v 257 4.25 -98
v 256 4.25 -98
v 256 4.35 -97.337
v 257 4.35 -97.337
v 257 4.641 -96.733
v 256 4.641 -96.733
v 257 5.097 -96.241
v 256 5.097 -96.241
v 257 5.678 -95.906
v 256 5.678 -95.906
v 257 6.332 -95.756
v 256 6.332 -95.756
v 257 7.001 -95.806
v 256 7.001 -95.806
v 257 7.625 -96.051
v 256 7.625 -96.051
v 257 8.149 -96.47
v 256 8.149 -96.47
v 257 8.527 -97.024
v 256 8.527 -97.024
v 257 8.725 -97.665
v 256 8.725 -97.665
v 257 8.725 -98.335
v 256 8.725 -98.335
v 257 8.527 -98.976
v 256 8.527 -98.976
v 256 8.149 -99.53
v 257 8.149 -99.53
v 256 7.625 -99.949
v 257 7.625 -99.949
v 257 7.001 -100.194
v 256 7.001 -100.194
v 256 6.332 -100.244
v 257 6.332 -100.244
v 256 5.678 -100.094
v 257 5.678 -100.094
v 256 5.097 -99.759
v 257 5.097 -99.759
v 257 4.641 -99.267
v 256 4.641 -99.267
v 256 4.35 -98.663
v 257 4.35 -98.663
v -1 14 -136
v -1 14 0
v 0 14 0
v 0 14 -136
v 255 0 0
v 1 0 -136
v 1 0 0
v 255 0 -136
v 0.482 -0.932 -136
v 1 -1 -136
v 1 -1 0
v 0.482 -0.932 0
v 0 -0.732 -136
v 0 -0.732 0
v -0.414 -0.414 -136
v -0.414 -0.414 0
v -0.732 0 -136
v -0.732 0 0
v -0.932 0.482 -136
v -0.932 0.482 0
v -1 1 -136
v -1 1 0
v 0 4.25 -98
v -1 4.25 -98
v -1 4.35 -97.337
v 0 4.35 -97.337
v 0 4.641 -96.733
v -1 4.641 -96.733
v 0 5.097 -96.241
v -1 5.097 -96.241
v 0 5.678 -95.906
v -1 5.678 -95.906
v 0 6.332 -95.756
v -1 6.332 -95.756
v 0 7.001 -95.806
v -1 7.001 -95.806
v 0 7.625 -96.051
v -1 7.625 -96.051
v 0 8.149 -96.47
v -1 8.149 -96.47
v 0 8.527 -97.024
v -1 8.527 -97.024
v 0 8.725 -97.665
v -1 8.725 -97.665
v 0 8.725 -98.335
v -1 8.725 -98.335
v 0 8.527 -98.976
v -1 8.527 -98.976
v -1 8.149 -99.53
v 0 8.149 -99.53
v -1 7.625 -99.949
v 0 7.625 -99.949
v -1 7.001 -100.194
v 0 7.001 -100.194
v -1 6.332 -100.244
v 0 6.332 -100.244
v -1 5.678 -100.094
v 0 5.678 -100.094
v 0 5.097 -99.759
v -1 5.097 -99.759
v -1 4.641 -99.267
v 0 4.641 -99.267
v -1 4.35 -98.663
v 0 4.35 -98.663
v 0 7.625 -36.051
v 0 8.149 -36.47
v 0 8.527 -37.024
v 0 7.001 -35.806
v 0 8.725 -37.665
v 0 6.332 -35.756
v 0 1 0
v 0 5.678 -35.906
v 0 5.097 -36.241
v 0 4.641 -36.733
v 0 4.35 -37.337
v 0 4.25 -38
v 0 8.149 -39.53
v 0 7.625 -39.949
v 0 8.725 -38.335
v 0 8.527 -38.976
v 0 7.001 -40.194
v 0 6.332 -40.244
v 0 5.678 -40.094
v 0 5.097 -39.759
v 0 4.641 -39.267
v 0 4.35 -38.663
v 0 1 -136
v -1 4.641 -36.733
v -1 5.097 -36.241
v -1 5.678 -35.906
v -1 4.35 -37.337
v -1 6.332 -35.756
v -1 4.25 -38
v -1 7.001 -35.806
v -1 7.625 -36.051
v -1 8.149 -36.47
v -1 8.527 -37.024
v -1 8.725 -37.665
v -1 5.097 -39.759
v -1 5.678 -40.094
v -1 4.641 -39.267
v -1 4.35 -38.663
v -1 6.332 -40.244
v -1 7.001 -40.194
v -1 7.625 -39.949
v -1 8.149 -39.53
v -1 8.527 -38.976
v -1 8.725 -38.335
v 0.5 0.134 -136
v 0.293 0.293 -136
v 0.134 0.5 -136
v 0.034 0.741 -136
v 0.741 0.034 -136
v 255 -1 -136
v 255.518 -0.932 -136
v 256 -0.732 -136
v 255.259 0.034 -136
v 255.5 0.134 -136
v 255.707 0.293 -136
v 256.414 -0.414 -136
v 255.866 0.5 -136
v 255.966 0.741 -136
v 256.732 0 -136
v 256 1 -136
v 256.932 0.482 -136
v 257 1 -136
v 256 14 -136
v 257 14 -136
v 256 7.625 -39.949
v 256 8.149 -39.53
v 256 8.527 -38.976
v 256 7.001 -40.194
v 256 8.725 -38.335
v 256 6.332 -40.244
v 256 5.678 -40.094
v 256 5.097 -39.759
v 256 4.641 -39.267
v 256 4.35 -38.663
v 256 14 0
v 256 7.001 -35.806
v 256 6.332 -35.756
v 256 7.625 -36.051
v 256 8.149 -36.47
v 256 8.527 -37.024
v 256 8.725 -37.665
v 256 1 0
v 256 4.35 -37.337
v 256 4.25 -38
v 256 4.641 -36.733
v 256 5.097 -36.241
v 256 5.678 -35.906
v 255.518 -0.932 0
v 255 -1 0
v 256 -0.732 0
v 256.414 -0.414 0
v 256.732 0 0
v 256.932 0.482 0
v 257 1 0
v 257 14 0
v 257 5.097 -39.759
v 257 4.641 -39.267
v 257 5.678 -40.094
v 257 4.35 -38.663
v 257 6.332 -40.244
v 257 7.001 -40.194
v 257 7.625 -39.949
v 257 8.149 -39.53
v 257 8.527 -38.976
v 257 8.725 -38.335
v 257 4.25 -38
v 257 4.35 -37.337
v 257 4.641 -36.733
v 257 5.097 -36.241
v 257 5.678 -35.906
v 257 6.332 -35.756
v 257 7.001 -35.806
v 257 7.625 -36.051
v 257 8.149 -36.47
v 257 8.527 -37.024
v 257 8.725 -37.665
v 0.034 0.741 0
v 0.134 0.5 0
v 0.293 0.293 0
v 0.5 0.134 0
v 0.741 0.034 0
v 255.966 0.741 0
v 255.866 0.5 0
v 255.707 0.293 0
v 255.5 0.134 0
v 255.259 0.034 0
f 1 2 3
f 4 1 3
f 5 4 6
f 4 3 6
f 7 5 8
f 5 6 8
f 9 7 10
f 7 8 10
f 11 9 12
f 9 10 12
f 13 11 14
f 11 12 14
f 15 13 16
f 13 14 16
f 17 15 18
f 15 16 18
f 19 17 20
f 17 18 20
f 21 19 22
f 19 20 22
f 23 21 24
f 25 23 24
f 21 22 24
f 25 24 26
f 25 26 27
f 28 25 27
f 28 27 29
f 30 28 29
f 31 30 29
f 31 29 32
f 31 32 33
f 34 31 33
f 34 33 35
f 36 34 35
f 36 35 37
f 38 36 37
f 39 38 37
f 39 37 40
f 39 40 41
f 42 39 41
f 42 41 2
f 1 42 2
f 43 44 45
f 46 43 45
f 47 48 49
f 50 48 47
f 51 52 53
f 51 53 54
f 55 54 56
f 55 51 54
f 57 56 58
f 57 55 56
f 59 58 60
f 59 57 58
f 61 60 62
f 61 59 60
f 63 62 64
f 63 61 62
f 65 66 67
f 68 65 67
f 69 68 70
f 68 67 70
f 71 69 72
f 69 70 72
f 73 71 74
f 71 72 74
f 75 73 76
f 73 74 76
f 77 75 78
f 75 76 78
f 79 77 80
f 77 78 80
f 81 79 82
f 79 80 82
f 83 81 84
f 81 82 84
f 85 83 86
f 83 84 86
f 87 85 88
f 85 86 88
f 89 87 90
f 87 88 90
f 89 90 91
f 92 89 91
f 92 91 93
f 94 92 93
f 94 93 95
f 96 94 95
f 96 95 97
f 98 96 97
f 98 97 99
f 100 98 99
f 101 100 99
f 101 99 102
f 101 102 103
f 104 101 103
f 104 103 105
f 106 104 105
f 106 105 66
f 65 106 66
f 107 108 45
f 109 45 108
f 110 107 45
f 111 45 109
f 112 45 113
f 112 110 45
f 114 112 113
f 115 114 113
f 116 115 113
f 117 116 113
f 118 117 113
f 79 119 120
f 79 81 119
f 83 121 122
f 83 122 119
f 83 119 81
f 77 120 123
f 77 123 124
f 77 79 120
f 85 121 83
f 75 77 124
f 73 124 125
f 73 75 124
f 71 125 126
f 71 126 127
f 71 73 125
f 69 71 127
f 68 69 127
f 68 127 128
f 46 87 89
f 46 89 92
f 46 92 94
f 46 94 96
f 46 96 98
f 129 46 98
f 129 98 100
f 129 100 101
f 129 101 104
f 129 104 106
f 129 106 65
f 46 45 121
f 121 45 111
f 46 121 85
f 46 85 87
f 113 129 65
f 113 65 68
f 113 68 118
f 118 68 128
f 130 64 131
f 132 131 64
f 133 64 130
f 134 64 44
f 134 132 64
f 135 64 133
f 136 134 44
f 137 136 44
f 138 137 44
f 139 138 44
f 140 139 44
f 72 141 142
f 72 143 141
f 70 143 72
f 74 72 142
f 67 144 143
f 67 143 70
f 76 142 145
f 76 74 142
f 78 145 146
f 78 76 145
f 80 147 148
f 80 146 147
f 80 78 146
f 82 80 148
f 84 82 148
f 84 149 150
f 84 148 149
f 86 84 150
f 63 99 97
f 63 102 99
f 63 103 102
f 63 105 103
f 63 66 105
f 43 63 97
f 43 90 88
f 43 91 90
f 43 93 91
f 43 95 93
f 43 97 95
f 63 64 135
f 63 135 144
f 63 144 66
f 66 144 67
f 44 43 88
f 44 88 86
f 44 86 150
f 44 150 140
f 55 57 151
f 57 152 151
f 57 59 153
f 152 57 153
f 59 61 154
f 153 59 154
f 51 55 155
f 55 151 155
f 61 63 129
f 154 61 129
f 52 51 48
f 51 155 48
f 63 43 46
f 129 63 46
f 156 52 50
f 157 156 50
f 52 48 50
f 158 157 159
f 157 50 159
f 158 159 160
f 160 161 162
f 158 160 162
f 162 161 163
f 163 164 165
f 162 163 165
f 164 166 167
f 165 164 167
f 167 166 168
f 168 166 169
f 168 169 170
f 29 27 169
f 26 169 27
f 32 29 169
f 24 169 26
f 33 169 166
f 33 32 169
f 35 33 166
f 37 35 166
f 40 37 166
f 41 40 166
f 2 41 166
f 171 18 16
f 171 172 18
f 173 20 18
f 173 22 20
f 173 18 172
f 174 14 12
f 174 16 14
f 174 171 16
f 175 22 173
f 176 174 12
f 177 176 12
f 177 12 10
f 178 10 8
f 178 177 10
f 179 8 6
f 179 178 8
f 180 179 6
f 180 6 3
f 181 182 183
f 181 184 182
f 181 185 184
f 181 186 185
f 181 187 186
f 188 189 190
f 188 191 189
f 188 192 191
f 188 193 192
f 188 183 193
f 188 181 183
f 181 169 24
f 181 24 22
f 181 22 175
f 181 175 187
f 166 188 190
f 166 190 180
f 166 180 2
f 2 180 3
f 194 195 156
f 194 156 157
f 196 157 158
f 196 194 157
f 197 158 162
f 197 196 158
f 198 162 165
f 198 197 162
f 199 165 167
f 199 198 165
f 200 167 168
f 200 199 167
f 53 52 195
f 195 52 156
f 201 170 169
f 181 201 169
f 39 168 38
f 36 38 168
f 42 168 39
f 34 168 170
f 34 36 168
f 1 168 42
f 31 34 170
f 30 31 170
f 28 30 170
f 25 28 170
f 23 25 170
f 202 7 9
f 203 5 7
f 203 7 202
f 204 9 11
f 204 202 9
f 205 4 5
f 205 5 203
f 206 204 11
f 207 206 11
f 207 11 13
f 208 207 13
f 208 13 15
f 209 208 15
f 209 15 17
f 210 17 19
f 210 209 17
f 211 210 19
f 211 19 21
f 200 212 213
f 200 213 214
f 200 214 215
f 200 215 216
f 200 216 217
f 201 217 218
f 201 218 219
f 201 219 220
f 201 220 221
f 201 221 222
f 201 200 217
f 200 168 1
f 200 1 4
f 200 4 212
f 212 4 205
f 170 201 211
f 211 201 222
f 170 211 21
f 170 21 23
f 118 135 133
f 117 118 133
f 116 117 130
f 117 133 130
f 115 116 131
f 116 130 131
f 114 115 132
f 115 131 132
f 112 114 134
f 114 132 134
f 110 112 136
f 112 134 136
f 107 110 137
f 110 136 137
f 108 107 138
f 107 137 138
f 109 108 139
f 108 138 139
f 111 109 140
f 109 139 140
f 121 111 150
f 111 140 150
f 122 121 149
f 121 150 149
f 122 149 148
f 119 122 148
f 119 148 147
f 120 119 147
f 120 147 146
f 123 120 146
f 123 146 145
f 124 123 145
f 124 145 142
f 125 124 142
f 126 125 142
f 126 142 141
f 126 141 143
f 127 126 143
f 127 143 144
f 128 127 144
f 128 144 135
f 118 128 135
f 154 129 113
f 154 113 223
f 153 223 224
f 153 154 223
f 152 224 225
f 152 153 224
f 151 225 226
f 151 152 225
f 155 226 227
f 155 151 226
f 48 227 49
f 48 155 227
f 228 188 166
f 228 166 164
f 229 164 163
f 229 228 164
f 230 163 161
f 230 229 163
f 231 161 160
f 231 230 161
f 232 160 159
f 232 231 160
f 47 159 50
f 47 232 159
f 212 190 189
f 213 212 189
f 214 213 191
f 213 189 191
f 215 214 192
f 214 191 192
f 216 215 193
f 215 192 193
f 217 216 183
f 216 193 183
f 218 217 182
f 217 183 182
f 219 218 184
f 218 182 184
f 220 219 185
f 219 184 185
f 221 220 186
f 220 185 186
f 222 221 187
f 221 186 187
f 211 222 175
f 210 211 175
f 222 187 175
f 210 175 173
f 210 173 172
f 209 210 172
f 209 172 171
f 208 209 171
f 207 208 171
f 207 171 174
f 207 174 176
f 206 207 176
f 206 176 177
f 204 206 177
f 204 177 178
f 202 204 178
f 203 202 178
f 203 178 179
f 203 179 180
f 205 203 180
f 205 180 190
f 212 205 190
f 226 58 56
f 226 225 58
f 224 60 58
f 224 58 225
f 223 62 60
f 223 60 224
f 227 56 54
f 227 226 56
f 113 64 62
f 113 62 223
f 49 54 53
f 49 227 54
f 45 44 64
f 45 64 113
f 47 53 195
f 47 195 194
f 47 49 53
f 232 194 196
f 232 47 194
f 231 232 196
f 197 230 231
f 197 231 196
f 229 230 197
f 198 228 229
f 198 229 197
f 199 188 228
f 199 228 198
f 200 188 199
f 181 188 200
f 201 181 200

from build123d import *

# Parameters (mm, degrees)
SKETCH1_W                    = 256
SKETCH1_H                    = 136
BASE_FLANGE1_DEPTH           = 1
EDGE_FLANGE1_STRIP_W         = 6
EDGE_FLANGE1_STRIP_H         = 1
EDGE_FLANGE1_STRIP_CUT_DEPTH = 136
EDGE_FLANGE1_DEPTH           = 136
EDGE_FLANGE2_STRIP_W         = 6
EDGE_FLANGE2_STRIP_H         = 1
EDGE_FLANGE2_STRIP_CUT_DEPTH = 136
EDGE_FLANGE2_DEPTH           = 136
SKETCH12_R                   = 2.25
CUT_EXTRUDE1_DEPTH           = 278


# Sheet-metal steps are written as plain solids
with BuildPart() as part:
    # Sketch1 → Base-Flange1 (new body)
    with BuildSketch(Plane(origin=(0, 0, 0), x_dir=(1, 0, 0), z_dir=(0, 1, 0))):
        with Locations((128, 68)):
            Rectangle(SKETCH1_W, SKETCH1_H)
    extrude(amount=-BASE_FLANGE1_DEPTH)

    # Edge-Flange1 strip (across the edge) → Edge-Flange1 strip cut (cut)
    with BuildSketch(Plane.XY.offset(-136)):
        with Locations((-2, -0.5)):
            Rectangle(EDGE_FLANGE1_STRIP_W, EDGE_FLANGE1_STRIP_H)
    extrude(amount=EDGE_FLANGE1_STRIP_CUT_DEPTH, mode=Mode.SUBTRACT)

    # Edge-Flange1 section (across the edge) → Edge-Flange1 (add)
    with BuildSketch(Plane.XY.offset(-136)):
        with BuildLine():
            Line((-1, 1), (-1, 14))
            Line((-1, 14), (0, 14))
            Line((0, 14), (0, 1))
            ThreePointArc((0, 1), (0.292893219, 0.292893219), (1, 0))
            Line((1, 0), (1, -1))
            ThreePointArc((1, -1), (-0.414213562, -0.414213562), (-1, 1))
        make_face()
    extrude(amount=EDGE_FLANGE1_DEPTH)

    # Edge-Flange2 strip (across the edge) → Edge-Flange2 strip cut (cut)
    with BuildSketch(Plane(origin=(256, 0, 0), x_dir=(-1, 0, 0), z_dir=(0, 0, -1))):
        with Locations((-2, -0.5)):
            Rectangle(EDGE_FLANGE2_STRIP_W, EDGE_FLANGE2_STRIP_H)
    extrude(amount=EDGE_FLANGE2_STRIP_CUT_DEPTH, mode=Mode.SUBTRACT)

    # Edge-Flange2 section (across the edge) → Edge-Flange2 (add)
    with BuildSketch(Plane(origin=(256, 0, 0), x_dir=(-1, 0, 0), z_dir=(0, 0, -1))):
        with BuildLine():
            Line((-1, 1), (-1, 14))
            Line((-1, 14), (0, 14))
            Line((0, 14), (0, 1))
            ThreePointArc((0, 1), (0.292893219, 0.292893219), (1, 0))
            Line((1, 0), (1, -1))
            ThreePointArc((1, -1), (-0.414213562, -0.414213562), (-1, 1))
        make_face()
    extrude(amount=EDGE_FLANGE2_DEPTH)

    # Sketch12 → Cut-Extrude1 (cut)
    with BuildSketch(Plane(origin=(-2, -333.400026456, -193.062536038), x_dir=(0, 1, 0), z_dir=(-1, 0, 0))):
        with Locations(Location((339.900026456, -95.062536038, 0), (0, 0, 180))):
            Circle(SKETCH12_R)
        with Locations(Location((339.900026456, -155.062536038, 0), (0, 0, 180))):
            Circle(SKETCH12_R)
    extrude(amount=-CUT_EXTRUDE1_DEPTH, mode=Mode.SUBTRACT)


solid = part.part
